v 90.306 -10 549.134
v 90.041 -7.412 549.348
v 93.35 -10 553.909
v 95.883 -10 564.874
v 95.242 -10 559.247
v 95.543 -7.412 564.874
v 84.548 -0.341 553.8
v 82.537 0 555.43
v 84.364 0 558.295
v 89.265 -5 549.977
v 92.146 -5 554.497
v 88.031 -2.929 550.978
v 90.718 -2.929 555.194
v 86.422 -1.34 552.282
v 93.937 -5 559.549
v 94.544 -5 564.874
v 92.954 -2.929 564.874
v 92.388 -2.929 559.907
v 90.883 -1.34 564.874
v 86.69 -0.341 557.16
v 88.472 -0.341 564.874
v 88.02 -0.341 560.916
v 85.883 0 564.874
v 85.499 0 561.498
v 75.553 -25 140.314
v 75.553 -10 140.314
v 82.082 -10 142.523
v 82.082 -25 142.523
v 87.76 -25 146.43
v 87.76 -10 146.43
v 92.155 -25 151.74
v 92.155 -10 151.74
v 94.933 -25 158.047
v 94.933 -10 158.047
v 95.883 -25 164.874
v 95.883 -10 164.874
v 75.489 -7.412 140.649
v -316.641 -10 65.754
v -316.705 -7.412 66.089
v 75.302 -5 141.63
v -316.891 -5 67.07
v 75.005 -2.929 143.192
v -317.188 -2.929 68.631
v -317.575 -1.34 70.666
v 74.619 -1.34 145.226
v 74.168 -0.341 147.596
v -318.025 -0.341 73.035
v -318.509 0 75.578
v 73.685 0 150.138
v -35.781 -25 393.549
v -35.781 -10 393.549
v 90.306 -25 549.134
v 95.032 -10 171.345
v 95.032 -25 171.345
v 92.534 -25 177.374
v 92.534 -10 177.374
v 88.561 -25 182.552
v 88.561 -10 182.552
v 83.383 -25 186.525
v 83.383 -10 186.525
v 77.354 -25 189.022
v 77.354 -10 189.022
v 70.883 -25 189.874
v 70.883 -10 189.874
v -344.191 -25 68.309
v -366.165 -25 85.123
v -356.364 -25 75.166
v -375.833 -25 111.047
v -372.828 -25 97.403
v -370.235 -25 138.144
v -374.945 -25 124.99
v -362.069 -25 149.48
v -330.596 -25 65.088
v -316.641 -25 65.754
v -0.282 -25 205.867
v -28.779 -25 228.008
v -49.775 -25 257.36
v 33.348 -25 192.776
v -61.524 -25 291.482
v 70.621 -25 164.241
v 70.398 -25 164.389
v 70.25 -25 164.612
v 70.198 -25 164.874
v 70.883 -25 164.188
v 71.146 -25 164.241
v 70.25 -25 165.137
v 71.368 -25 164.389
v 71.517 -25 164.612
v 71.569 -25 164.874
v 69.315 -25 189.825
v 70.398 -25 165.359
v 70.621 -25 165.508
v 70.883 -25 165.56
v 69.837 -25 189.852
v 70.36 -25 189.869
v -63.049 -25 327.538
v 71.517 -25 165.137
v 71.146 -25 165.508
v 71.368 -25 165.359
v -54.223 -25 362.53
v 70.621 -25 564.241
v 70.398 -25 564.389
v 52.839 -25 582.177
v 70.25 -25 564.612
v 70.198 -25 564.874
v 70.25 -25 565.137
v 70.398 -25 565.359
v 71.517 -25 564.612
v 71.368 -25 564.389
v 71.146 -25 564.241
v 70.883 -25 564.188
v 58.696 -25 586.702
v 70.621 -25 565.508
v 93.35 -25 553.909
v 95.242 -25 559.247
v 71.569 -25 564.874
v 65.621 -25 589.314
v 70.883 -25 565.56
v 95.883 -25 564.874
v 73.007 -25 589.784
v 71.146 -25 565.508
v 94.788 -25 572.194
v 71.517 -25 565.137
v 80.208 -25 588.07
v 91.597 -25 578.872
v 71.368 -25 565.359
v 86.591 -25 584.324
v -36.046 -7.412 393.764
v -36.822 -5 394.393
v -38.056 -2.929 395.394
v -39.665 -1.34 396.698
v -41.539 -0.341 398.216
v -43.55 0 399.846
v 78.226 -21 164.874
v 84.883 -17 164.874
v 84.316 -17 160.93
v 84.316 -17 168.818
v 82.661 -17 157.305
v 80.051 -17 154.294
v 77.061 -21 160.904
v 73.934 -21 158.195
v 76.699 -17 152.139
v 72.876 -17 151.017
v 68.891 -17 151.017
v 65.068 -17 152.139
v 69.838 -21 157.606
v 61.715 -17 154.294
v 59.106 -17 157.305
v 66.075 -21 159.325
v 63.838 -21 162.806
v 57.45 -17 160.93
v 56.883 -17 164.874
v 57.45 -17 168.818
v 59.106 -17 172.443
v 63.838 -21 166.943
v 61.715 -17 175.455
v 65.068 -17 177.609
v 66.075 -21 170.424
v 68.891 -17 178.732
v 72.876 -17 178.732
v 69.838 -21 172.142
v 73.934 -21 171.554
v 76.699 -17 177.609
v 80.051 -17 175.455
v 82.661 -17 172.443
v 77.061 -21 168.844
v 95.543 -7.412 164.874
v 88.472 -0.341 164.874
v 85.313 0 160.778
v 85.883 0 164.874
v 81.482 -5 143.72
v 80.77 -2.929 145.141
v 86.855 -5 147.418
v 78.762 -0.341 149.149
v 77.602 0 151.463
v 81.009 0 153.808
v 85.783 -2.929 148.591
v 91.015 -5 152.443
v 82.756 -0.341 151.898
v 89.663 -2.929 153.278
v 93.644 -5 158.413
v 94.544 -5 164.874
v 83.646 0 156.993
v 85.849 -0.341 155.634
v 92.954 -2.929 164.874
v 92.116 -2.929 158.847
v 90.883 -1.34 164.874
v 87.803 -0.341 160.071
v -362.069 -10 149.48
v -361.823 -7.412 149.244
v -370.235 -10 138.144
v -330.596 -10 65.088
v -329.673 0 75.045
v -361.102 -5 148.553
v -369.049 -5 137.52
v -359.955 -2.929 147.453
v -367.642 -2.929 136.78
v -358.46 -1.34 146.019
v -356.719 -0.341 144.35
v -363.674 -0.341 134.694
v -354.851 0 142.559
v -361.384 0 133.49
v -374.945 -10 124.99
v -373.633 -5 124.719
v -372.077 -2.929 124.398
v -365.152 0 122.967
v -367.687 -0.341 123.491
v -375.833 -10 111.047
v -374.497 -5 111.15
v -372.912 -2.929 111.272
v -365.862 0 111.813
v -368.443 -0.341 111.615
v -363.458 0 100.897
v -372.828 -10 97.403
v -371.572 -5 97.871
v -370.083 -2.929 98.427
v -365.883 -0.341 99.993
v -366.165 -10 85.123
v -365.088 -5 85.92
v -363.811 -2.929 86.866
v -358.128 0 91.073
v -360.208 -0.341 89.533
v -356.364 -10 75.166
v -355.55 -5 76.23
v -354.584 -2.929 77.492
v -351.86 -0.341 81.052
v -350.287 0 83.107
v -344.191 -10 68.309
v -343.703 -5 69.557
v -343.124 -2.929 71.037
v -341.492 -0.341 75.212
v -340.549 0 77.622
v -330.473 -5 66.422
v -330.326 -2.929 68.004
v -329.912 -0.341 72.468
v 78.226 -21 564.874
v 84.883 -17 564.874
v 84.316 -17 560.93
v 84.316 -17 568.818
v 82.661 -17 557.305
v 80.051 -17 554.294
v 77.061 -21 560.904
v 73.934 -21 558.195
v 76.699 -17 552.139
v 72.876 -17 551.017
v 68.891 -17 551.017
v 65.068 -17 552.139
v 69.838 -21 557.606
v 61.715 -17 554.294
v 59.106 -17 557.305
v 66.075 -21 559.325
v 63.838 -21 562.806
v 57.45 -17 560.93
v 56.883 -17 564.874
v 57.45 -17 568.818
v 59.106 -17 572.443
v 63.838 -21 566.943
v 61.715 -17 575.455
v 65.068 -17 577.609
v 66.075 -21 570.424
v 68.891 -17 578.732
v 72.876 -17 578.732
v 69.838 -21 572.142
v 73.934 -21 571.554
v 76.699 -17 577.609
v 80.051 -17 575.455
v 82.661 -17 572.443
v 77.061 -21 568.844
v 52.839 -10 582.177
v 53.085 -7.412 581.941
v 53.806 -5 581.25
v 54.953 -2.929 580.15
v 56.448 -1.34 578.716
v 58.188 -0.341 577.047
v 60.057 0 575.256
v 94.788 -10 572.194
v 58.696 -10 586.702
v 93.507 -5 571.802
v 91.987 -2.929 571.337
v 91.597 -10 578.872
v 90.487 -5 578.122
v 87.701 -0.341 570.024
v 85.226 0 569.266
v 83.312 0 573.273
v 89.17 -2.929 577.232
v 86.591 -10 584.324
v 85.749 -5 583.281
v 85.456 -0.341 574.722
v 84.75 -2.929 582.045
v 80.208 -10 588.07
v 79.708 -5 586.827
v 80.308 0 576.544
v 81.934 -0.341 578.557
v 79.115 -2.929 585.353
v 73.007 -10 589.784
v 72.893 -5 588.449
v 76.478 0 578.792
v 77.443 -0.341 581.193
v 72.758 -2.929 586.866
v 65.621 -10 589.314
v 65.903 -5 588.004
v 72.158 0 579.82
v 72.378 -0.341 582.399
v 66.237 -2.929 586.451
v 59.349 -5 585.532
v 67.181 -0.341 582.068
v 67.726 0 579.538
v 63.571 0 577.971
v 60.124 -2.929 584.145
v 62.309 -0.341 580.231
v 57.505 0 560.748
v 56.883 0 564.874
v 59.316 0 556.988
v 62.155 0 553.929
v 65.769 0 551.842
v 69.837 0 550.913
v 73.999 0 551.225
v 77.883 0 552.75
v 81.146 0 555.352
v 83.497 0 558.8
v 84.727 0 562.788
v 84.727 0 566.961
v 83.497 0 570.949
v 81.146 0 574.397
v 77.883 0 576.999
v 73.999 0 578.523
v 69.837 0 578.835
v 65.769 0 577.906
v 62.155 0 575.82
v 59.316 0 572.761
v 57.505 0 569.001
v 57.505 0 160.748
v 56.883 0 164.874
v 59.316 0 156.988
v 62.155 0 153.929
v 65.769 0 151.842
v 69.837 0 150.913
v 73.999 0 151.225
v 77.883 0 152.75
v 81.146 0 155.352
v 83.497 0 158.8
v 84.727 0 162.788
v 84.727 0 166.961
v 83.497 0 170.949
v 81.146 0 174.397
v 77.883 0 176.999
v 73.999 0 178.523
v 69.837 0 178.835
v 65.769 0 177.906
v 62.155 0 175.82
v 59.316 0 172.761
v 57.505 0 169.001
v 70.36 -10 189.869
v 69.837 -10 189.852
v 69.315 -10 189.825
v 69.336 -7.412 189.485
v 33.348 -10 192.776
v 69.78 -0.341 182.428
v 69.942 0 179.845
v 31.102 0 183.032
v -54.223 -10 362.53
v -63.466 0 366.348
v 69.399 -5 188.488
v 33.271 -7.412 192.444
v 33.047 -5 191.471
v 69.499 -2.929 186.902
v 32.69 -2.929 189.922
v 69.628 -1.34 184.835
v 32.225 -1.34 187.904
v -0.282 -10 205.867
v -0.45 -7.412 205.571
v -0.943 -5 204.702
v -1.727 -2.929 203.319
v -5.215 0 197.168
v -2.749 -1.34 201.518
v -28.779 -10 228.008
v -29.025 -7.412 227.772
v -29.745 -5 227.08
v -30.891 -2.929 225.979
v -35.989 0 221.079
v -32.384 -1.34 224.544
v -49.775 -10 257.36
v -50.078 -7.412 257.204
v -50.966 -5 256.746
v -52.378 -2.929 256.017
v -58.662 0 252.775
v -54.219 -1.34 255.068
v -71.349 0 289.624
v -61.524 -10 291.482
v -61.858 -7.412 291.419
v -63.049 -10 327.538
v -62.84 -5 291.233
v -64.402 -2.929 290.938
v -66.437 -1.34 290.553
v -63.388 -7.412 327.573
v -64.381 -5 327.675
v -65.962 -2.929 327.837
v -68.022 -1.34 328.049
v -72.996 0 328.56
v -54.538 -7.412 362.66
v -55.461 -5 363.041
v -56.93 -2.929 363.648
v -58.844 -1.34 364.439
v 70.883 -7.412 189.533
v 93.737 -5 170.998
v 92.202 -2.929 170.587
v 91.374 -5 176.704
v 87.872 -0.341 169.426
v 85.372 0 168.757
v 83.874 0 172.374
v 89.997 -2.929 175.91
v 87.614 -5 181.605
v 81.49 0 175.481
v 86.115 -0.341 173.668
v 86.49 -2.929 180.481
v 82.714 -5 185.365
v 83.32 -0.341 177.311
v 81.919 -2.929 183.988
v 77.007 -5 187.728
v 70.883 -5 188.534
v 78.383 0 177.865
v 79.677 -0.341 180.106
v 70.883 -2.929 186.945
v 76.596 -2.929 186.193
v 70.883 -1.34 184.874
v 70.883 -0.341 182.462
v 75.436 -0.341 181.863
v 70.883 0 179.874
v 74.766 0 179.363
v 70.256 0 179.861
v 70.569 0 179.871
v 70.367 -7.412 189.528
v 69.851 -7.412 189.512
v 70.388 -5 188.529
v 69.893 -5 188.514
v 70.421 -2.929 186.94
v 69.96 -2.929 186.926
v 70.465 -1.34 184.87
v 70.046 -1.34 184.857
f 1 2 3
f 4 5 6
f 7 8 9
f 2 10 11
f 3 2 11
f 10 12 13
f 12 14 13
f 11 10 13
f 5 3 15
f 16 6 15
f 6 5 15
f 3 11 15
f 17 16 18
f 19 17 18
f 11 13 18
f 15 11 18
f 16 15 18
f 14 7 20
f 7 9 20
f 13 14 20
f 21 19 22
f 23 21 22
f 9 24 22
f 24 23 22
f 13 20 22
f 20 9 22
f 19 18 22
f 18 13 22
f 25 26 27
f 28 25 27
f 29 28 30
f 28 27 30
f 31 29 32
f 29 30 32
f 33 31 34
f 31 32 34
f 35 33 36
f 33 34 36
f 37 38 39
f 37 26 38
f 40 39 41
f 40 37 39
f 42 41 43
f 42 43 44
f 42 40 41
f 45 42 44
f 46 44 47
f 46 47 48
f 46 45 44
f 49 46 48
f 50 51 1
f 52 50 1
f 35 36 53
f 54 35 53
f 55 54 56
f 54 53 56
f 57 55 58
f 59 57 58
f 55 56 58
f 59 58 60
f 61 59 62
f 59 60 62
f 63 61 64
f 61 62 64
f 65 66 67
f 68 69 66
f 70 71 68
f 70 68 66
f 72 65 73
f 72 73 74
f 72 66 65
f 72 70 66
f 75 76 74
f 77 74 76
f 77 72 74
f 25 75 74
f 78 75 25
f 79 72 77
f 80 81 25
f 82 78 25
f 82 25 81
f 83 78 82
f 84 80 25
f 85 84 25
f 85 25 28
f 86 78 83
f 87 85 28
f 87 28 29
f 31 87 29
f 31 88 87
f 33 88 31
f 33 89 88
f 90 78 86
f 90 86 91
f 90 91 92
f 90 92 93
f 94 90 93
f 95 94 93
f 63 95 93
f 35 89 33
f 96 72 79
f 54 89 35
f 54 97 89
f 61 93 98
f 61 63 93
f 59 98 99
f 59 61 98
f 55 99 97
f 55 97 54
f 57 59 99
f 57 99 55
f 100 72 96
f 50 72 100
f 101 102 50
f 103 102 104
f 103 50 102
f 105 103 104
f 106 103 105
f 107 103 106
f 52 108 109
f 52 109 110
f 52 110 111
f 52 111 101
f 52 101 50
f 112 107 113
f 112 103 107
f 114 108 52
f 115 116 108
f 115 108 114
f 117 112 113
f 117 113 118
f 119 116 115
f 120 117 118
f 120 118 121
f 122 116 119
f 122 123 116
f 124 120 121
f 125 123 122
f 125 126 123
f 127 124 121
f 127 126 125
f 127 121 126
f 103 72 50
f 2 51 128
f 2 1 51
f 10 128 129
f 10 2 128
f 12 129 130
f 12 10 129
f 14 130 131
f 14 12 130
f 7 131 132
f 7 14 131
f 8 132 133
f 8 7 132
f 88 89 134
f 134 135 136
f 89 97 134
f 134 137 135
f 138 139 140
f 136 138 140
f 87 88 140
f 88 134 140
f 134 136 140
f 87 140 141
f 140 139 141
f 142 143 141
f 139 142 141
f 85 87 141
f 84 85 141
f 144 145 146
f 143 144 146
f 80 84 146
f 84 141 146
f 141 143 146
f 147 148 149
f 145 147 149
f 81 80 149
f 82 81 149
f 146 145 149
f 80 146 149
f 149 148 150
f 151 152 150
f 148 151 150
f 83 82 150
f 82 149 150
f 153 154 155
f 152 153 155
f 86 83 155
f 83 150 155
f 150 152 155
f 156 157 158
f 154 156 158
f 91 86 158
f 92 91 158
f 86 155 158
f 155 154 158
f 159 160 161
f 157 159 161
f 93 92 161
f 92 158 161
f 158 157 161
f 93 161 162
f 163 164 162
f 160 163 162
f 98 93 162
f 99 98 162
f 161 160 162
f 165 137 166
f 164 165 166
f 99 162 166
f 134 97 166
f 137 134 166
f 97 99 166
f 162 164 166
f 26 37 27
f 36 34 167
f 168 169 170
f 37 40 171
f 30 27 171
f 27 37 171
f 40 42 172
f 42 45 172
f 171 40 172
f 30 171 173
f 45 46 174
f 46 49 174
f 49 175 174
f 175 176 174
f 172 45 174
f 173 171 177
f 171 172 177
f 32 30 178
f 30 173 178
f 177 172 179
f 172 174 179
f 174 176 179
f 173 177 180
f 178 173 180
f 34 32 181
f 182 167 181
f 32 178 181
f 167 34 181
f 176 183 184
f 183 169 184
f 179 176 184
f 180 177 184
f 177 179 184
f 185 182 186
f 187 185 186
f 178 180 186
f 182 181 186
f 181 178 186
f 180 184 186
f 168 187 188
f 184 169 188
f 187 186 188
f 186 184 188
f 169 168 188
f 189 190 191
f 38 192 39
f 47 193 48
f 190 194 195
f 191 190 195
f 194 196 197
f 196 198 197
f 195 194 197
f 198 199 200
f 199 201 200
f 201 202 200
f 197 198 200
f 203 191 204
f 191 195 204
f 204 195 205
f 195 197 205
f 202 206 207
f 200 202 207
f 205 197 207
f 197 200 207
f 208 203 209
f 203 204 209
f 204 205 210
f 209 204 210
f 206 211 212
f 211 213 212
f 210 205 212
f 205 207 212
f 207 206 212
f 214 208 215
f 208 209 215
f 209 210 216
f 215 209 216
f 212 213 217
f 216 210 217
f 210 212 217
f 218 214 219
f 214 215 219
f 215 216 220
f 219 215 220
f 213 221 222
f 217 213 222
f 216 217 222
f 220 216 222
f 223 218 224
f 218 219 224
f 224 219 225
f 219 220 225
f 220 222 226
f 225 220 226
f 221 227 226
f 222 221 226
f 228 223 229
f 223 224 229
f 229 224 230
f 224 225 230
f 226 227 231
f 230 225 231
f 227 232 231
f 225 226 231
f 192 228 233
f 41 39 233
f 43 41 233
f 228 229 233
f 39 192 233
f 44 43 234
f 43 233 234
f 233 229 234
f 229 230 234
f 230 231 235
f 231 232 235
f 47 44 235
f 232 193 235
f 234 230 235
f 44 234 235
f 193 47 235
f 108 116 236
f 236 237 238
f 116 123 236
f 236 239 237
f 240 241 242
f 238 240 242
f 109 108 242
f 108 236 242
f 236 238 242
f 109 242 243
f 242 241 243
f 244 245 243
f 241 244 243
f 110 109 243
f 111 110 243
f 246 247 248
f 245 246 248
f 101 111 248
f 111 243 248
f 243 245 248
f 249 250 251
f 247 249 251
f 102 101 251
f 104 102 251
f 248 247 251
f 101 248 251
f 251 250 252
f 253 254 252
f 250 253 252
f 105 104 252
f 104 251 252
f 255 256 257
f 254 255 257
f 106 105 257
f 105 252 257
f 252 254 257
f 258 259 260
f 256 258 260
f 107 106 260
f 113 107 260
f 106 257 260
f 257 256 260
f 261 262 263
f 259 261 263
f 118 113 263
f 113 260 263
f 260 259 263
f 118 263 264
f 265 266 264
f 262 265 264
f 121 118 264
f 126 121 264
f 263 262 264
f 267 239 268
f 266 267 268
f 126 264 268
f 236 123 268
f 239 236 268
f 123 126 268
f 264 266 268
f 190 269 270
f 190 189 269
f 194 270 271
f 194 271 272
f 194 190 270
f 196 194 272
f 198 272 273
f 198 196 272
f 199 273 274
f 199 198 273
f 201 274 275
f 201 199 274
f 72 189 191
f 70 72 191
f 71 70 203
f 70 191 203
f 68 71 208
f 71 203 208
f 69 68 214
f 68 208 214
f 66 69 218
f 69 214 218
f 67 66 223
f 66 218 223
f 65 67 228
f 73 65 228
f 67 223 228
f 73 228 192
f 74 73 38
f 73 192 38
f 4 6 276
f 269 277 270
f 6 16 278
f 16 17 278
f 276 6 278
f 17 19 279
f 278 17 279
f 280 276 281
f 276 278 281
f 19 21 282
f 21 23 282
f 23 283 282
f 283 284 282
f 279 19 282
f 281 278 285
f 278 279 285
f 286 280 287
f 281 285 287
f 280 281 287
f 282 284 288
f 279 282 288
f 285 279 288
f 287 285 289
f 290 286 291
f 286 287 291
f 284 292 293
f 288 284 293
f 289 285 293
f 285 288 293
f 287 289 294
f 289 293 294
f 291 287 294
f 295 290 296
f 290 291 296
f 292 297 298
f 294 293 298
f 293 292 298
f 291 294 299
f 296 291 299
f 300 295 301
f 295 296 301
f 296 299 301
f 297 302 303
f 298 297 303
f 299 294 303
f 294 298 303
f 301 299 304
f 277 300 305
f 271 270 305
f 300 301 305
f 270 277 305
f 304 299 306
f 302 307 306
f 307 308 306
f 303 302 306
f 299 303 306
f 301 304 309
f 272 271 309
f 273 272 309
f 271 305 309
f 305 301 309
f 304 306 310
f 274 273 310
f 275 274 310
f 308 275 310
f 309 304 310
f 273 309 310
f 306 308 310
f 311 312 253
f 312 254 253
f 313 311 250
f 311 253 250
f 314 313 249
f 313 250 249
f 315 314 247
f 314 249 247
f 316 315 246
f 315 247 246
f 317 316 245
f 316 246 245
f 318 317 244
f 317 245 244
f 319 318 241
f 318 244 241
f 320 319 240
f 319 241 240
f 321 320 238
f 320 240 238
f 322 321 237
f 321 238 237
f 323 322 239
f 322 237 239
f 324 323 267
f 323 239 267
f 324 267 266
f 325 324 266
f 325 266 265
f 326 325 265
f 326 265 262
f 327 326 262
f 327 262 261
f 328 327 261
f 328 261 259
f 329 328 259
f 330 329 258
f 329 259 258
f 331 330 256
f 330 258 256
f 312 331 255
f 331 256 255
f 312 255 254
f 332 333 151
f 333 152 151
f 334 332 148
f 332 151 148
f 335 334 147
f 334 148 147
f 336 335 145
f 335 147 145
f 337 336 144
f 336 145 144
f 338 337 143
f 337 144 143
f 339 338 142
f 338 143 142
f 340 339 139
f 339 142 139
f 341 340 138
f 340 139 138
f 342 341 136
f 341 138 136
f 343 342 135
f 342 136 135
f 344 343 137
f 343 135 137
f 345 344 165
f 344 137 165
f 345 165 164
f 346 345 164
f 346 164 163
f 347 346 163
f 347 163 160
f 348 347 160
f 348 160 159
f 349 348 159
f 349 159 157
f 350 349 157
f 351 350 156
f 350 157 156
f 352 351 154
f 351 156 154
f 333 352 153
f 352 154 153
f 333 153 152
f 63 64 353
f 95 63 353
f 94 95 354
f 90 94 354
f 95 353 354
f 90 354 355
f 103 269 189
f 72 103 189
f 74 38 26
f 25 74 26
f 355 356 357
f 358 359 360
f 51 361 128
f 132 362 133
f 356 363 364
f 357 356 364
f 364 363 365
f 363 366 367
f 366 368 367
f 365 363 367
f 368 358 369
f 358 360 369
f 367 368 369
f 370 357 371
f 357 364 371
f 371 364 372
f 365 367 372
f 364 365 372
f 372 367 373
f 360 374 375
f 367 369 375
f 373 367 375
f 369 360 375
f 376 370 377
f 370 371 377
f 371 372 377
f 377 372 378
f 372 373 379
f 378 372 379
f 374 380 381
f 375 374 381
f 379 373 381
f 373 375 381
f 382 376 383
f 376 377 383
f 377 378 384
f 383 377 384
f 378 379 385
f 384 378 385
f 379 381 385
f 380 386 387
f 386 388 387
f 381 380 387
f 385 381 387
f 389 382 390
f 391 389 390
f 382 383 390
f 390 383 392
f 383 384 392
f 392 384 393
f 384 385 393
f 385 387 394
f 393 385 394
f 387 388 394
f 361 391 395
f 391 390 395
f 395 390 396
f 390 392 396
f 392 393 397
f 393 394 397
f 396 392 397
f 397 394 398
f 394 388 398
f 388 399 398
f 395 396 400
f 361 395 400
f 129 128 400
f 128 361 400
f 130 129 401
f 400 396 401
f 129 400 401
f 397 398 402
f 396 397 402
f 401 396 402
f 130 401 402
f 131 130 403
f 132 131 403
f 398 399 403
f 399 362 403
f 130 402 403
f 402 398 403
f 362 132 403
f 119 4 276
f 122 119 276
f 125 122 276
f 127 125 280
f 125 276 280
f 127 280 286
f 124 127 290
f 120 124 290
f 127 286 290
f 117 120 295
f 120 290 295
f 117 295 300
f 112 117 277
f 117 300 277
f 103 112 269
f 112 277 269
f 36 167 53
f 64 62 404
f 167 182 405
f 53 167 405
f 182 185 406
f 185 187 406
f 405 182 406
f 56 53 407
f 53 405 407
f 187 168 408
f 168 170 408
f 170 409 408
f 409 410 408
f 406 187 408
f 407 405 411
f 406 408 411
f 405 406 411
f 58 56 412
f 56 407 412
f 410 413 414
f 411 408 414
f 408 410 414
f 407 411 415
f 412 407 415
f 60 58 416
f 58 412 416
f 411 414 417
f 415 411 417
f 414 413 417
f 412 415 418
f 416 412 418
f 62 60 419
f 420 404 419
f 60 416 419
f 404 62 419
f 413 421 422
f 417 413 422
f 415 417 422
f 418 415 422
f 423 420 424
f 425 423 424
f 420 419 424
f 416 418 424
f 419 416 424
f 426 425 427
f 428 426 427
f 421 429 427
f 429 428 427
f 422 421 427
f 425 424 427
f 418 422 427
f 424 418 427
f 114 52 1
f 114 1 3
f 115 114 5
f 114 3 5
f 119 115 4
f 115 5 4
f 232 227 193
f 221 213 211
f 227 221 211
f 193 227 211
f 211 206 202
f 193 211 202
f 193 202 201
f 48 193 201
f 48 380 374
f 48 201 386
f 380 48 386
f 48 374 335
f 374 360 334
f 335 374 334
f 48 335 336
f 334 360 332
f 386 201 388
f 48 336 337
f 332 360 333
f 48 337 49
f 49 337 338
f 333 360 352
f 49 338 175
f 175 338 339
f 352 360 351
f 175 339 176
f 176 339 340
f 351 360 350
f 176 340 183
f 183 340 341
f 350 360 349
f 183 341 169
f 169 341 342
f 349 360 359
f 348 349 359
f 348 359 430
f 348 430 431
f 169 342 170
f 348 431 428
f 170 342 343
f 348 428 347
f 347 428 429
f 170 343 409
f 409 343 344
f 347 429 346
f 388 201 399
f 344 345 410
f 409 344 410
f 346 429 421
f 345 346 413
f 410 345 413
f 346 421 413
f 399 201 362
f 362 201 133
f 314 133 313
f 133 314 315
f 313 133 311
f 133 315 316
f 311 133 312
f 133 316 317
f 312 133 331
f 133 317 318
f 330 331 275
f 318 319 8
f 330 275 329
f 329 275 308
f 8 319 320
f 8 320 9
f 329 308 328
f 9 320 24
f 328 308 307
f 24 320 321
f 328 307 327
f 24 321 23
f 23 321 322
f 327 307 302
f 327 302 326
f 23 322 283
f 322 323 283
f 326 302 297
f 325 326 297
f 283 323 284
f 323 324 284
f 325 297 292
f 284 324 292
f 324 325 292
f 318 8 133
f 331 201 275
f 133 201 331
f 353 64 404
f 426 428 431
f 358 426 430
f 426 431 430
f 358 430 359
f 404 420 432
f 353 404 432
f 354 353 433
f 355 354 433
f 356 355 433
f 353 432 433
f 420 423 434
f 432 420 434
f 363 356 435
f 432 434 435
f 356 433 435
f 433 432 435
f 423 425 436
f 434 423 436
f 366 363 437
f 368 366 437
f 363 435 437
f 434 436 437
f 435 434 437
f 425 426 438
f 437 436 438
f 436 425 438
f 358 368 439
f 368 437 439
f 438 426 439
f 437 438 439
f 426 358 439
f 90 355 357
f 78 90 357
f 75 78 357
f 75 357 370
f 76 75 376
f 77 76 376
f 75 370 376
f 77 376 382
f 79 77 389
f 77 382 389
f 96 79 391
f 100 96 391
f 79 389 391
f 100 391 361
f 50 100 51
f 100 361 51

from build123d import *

# Parameters (mm, degrees)
F1_DEPTH = 25
F2_D     = 28
F2_DEPTH = 17
F2_TIP   = 8.4120486664
F3_D     = 28
F3_DEPTH = 17
F3_TIP   = 8.4120486664
F4_R     = 10
F5_DEPTH = 25


with BuildPart() as f1:
    # F0 (on Front) → F1 (new body)
    with BuildSketch(Plane.XZ):
        with BuildLine():
            Line((-279.2028378171, 167.9137703829), (54.3474347586, 546.1242293713))
            ThreePointArc((54.3474347586, 546.1242293713), (45.905243427, 563.8289204578), (52.8386613021, 582.1770647105))
            Line((52.8386613021, 582.1770647105), (-362.0687545083, 149.4799000496))
            ThreePointArc((-362.0687545083, 149.4799000496), (-347.0310263397, 160.2264674692), (-329.1166074138, 164.7757063423))
            Line((-329.1166074138, 164.7757063423), (-279.2028378171, 167.9137703829))
        make_face()
        with BuildLine():
            ThreePointArc((70.8833804527, 539.8742293713), (62.0445456879, 541.488870704), (54.3474347586, 546.1242293713))
            Line((54.3474347586, 546.1242293713), (-279.2028378171, 167.9137703829))
            Line((-279.2028378171, 167.9137703829), (-215.3865282422, 171.9258830303))
            Line((-215.3865282422, 171.9258830303), (-35.7808883073, 393.5494389695))
            Line((-35.7808883073, 393.5494389695), (70.8833804527, 525.16732437))
            Line((70.8833804527, 525.16732437), (70.8833804527, 539.8742293713))
        make_face()
        with BuildLine():
            Line((-215.3865282422, 171.9258830303), (-279.2028378171, 167.9137703829))
            Line((-279.2028378171, 167.9137703829), (-292.9074248186, 152.3742293713))
            ThreePointArc((-292.9074248186, 152.3742293713), (-281.7851423828, 138.2595880387), (-276.3714791245, 121.1242293713))
            Line((-276.3714791245, 121.1242293713), (-254.3034374995, 123.904541279))
            Line((-254.3034374995, 123.904541279), (-215.3865282422, 171.9258830303))
        make_face()
        with BuildLine():
            Line((-35.7808883073, 393.5494389695), (-215.3865282422, 171.9258830303))
            Line((-215.3865282422, 171.9258830303), (69.3147348493, 189.8249678568))
            ThreePointArc((69.3147348493, 189.8249678568), (-49.7750455866, 257.3601064033), (-35.7808883073, 393.5494389695))
        make_face()
        with BuildLine():
            Line((54.3474347586, 546.1242293713), (61.788610321, 554.5617293713))
            ThreePointArc((61.788610321, 554.5617293713), (65.226110321, 577.4064995031), (84.6333804527, 564.8742293713))
            ThreePointArc((84.6333804527, 564.8742293713), (80.6060986941, 555.15151113), (70.8833804527, 551.1242293713))
            Line((70.8833804527, 551.1242293713), (70.8833804527, 539.8742293713))
            ThreePointArc((70.8833804527, 539.8742293713), (81.64190304, 542.3075683037), (90.3060950779, 549.1338940322))
            ThreePointArc((90.3060950779, 549.1338940322), (94.4478437994, 556.5246145787), (95.8833804527, 564.8742293713))
            ThreePointArc((95.8833804527, 564.8742293713), (80.2075968068, 588.0703279524), (52.8386613021, 582.1770647105))
            ThreePointArc((52.8386613021, 582.1770647105), (45.905243427, 563.8289204578), (54.3474347586, 546.1242293713))
        make_face()
        with BuildLine():
            ThreePointArc((70.8833804527, 551.1242293713), (66.0220213321, 552.0122821043), (61.788610321, 554.5617293713))
            Line((61.788610321, 554.5617293713), (54.3474347586, 546.1242293713))
            ThreePointArc((54.3474347586, 546.1242293713), (62.0445456879, 541.488870704), (70.8833804527, 539.8742293713))
            Line((70.8833804527, 539.8742293713), (70.8833804527, 551.1242293713))
        make_face()
        with BuildLine():
            Line((70.8833804527, 551.1242293713), (70.8833804527, 564.8742293713))
            Line((70.8833804527, 564.8742293713), (61.788610321, 554.5617293713))
            ThreePointArc((61.788610321, 554.5617293713), (66.0220213321, 552.0122821043), (70.8833804527, 551.1242293713))
        make_face()
        with BuildLine():
            Line((61.788610321, 554.5617293713), (70.8833804527, 564.8742293713))
            Line((70.8833804527, 564.8742293713), (70.8833804527, 551.1242293713))
            ThreePointArc((70.8833804527, 551.1242293713), (80.6060986941, 555.15151113), (84.6333804527, 564.8742293713))
            ThreePointArc((84.6333804527, 564.8742293713), (65.226110321, 577.4064995031), (61.788610321, 554.5617293713))
        make_face()
        with BuildLine():
            Line((69.3147348493, 189.8249678568), (-215.3865282422, 171.9258830303))
            Line((-215.3865282422, 171.9258830303), (-254.3034374995, 123.904541279))
            Line((-254.3034374995, 123.904541279), (46.0794619115, 161.7492293713))
            ThreePointArc((46.0794619115, 161.7492293713), (51.6235827444, 180.8134951083), (69.3147348493, 189.8249678568))
        make_face()
        with BuildLine():
            Line((-325.9793162069, 114.8742293713), (-306.136181374, 137.3742293713))
            ThreePointArc((-306.136181374, 137.3742293713), (-353.3224510399, 102.5310945383), (-295.9793162069, 114.8742293713))
            ThreePointArc((-295.9793162069, 114.8742293713), (-296.0381984298, 116.7529167476), (-296.2146139575, 118.6242293713))
            Line((-296.2146139575, 118.6242293713), (-325.9793162069, 114.8742293713))
        make_face()
        with BuildLine():
            Line((-306.136181374, 137.3742293713), (-292.9074248186, 152.3742293713))
            ThreePointArc((-292.9074248186, 152.3742293713), (-309.7784140786, 162.1767744427), (-329.1166074138, 164.7757063423))
            ThreePointArc((-329.1166074138, 164.7757063423), (-347.0310263397, 160.2264674692), (-362.0687545083, 149.4799000496))
            ThreePointArc((-362.0687545083, 149.4799000496), (-369.9271571596, 91.0291612104), (-316.6410453648, 65.7540024004))
            ThreePointArc((-316.6410453648, 65.7540024004), (-300.3237958419, 71.9580986651), (-287.1338869566, 83.3935586931))
            ThreePointArc((-287.1338869566, 83.3935586931), (-278.8503895137, 98.1749997861), (-275.9793162069, 114.8742293713))
            ThreePointArc((-275.9793162069, 114.8742293713), (-276.0774532451, 118.0053749985), (-276.3714791245, 121.1242293713))
            Line((-276.3714791245, 121.1242293713), (-296.2146139575, 118.6242293713))
            ThreePointArc((-296.2146139575, 118.6242293713), (-296.0381984298, 116.7529167476), (-295.9793162069, 114.8742293713))
            ThreePointArc((-295.9793162069, 114.8742293713), (-353.3224510399, 102.5310945383), (-306.136181374, 137.3742293713))
        make_face()
        with BuildLine():
            ThreePointArc((-276.3714791245, 121.1242293713), (-281.7851423828, 138.2595880387), (-292.9074248186, 152.3742293713))
            Line((-292.9074248186, 152.3742293713), (-306.136181374, 137.3742293713))
            ThreePointArc((-306.136181374, 137.3742293713), (-299.4628119124, 128.9054445717), (-296.2146139575, 118.6242293713))
            Line((-296.2146139575, 118.6242293713), (-276.3714791245, 121.1242293713))
        make_face()
        with BuildLine():
            Line((-292.9074248186, 152.3742293713), (-279.2028378171, 167.9137703829))
            Line((-279.2028378171, 167.9137703829), (-329.1166074138, 164.7757063423))
            ThreePointArc((-329.1166074138, 164.7757063423), (-309.7784140786, 162.1767744427), (-292.9074248186, 152.3742293713))
        make_face()
        with BuildLine():
            Line((-254.3034374995, 123.904541279), (-276.3714791245, 121.1242293713))
            ThreePointArc((-276.3714791245, 121.1242293713), (-276.0774532451, 118.0053749985), (-275.9793162069, 114.8742293713))
            ThreePointArc((-275.9793162069, 114.8742293713), (-278.8503895137, 98.1749997861), (-287.1338869566, 83.3935586931))
            Line((-287.1338869566, 83.3935586931), (-254.3034374995, 123.904541279))
        make_face()
        with BuildLine():
            Line((46.0794619115, 161.7492293713), (-254.3034374995, 123.904541279))
            Line((-254.3034374995, 123.904541279), (-287.1338869566, 83.3935586931))
            ThreePointArc((-287.1338869566, 83.3935586931), (-300.3237958419, 71.9580986651), (-316.6410453648, 65.7540024004))
            Line((-316.6410453648, 65.7540024004), (75.5525158738, 140.3141158858))
            ThreePointArc((75.5525158738, 140.3141158858), (56.1790139122, 144.6558811539), (46.0794619115, 161.7492293713))
        make_face()
        with BuildLine():
            ThreePointArc((-296.2146139575, 118.6242293713), (-299.4628119124, 128.9054445717), (-306.136181374, 137.3742293713))
            Line((-306.136181374, 137.3742293713), (-325.9793162069, 114.8742293713))
            Line((-325.9793162069, 114.8742293713), (-296.2146139575, 118.6242293713))
        make_face()
        with BuildLine():
            ThreePointArc((70.8833804527, 189.8742293713), (70.098670996, 189.8619109578), (69.3147348493, 189.8249678568))
            ThreePointArc((69.3147348493, 189.8249678568), (51.6235827444, 180.8134951083), (46.0794619115, 161.7492293713))
            Line((46.0794619115, 161.7492293713), (57.2412252551, 163.1554793713))
            ThreePointArc((57.2412252551, 163.1554793713), (60.5708804527, 173.9689995031), (70.8833804527, 178.6242293713))
            Line((70.8833804527, 178.6242293713), (70.8833804527, 189.8742293713))
        make_face()
        with BuildLine():
            ThreePointArc((70.8833804527, 178.6242293713), (60.5708804527, 173.9689995031), (57.2412252551, 163.1554793713))
            Line((57.2412252551, 163.1554793713), (70.8833804527, 164.8742293713))
            Line((70.8833804527, 164.8742293713), (70.8833804527, 178.6242293713))
        make_face()
        with BuildLine():
            Line((70.8833804527, 164.8742293713), (57.2412252551, 163.1554793713))
            ThreePointArc((57.2412252551, 163.1554793713), (71.7444455002, 151.1512170568), (84.6333804527, 164.8742293713))
            ThreePointArc((84.6333804527, 164.8742293713), (80.6060986941, 174.5969476126), (70.8833804527, 178.6242293713))
            Line((70.8833804527, 178.6242293713), (70.8833804527, 164.8742293713))
        make_face()
        with BuildLine():
            Line((57.2412252551, 163.1554793713), (46.0794619115, 161.7492293713))
            ThreePointArc((46.0794619115, 161.7492293713), (56.1790139122, 144.6558811539), (75.5525158738, 140.3141158858))
            ThreePointArc((75.5525158738, 140.3141158858), (90.1412150341, 148.9325918382), (95.8833804527, 164.8742293713))
            ThreePointArc((95.8833804527, 164.8742293713), (88.5610499824, 182.551898901), (70.8833804527, 189.8742293713))
            Line((70.8833804527, 189.8742293713), (70.8833804527, 178.6242293713))
            ThreePointArc((70.8833804527, 178.6242293713), (80.6060986941, 174.5969476126), (84.6333804527, 164.8742293713))
            ThreePointArc((84.6333804527, 164.8742293713), (71.7444455002, 151.1512170568), (57.2412252551, 163.1554793713))
        make_face()
        with BuildLine():
            ThreePointArc((90.3060950779, 549.1338940322), (81.64190304, 542.3075683037), (70.8833804527, 539.8742293713))
            Line((70.8833804527, 539.8742293713), (70.8833804527, 525.16732437))
            Line((70.8833804527, 525.16732437), (90.3060950779, 549.1338940322))
        make_face()
    extrude(amount=F1_DEPTH)

    # F2
    with Locations(Plane(origin=(0, 0, 0), x_dir=(1, 0, 0), z_dir=(0, 1, 0))):
        with Locations((70.8833804527, -564.8742293713)):
            Hole(F2_D / 2, depth=F2_DEPTH)
            with Locations((0, 0, -(F2_DEPTH + F2_TIP / 2))):  # 118° drill point
                Cone(0, F2_D / 2, F2_TIP, mode=Mode.SUBTRACT)

    # F3
    with Locations(Plane(origin=(0, 0, 0), x_dir=(1, 0, 0), z_dir=(0, 1, 0))):
        with Locations((70.8833804527, -164.8742293713)):
            Hole(F3_D / 2, depth=F3_DEPTH)
            with Locations((0, 0, -(F3_DEPTH + F3_TIP / 2))):  # 118° drill point
                Cone(0, F3_D / 2, F3_TIP, mode=Mode.SUBTRACT)

    # F4
    f4_edges = [f1.edges().sort_by_distance(p)[0] for p in [
        (-49.775046, 0, 257.360106),
        (95.687299, 0, 167.999229),
    ]]
    fillet(f4_edges, radius=F4_R)

    # F0 (on Front) → F5 (join)
    with BuildSketch(Plane.XZ):
        with BuildLine():
            Line((-325.9793162069, 114.8742293713), (-306.136181374, 137.3742293713))
            ThreePointArc((-306.136181374, 137.3742293713), (-353.3224510399, 102.5310945383), (-295.9793162069, 114.8742293713))
            ThreePointArc((-295.9793162069, 114.8742293713), (-296.0381984298, 116.7529167476), (-296.2146139575, 118.6242293713))
            Line((-296.2146139575, 118.6242293713), (-325.9793162069, 114.8742293713))
        make_face()
        with BuildLine():
            ThreePointArc((-296.2146139575, 118.6242293713), (-299.4628119124, 128.9054445717), (-306.136181374, 137.3742293713))
            Line((-306.136181374, 137.3742293713), (-325.9793162069, 114.8742293713))
            Line((-325.9793162069, 114.8742293713), (-296.2146139575, 118.6242293713))
        make_face()
    extrude(amount=F5_DEPTH)


solid = f1.part
